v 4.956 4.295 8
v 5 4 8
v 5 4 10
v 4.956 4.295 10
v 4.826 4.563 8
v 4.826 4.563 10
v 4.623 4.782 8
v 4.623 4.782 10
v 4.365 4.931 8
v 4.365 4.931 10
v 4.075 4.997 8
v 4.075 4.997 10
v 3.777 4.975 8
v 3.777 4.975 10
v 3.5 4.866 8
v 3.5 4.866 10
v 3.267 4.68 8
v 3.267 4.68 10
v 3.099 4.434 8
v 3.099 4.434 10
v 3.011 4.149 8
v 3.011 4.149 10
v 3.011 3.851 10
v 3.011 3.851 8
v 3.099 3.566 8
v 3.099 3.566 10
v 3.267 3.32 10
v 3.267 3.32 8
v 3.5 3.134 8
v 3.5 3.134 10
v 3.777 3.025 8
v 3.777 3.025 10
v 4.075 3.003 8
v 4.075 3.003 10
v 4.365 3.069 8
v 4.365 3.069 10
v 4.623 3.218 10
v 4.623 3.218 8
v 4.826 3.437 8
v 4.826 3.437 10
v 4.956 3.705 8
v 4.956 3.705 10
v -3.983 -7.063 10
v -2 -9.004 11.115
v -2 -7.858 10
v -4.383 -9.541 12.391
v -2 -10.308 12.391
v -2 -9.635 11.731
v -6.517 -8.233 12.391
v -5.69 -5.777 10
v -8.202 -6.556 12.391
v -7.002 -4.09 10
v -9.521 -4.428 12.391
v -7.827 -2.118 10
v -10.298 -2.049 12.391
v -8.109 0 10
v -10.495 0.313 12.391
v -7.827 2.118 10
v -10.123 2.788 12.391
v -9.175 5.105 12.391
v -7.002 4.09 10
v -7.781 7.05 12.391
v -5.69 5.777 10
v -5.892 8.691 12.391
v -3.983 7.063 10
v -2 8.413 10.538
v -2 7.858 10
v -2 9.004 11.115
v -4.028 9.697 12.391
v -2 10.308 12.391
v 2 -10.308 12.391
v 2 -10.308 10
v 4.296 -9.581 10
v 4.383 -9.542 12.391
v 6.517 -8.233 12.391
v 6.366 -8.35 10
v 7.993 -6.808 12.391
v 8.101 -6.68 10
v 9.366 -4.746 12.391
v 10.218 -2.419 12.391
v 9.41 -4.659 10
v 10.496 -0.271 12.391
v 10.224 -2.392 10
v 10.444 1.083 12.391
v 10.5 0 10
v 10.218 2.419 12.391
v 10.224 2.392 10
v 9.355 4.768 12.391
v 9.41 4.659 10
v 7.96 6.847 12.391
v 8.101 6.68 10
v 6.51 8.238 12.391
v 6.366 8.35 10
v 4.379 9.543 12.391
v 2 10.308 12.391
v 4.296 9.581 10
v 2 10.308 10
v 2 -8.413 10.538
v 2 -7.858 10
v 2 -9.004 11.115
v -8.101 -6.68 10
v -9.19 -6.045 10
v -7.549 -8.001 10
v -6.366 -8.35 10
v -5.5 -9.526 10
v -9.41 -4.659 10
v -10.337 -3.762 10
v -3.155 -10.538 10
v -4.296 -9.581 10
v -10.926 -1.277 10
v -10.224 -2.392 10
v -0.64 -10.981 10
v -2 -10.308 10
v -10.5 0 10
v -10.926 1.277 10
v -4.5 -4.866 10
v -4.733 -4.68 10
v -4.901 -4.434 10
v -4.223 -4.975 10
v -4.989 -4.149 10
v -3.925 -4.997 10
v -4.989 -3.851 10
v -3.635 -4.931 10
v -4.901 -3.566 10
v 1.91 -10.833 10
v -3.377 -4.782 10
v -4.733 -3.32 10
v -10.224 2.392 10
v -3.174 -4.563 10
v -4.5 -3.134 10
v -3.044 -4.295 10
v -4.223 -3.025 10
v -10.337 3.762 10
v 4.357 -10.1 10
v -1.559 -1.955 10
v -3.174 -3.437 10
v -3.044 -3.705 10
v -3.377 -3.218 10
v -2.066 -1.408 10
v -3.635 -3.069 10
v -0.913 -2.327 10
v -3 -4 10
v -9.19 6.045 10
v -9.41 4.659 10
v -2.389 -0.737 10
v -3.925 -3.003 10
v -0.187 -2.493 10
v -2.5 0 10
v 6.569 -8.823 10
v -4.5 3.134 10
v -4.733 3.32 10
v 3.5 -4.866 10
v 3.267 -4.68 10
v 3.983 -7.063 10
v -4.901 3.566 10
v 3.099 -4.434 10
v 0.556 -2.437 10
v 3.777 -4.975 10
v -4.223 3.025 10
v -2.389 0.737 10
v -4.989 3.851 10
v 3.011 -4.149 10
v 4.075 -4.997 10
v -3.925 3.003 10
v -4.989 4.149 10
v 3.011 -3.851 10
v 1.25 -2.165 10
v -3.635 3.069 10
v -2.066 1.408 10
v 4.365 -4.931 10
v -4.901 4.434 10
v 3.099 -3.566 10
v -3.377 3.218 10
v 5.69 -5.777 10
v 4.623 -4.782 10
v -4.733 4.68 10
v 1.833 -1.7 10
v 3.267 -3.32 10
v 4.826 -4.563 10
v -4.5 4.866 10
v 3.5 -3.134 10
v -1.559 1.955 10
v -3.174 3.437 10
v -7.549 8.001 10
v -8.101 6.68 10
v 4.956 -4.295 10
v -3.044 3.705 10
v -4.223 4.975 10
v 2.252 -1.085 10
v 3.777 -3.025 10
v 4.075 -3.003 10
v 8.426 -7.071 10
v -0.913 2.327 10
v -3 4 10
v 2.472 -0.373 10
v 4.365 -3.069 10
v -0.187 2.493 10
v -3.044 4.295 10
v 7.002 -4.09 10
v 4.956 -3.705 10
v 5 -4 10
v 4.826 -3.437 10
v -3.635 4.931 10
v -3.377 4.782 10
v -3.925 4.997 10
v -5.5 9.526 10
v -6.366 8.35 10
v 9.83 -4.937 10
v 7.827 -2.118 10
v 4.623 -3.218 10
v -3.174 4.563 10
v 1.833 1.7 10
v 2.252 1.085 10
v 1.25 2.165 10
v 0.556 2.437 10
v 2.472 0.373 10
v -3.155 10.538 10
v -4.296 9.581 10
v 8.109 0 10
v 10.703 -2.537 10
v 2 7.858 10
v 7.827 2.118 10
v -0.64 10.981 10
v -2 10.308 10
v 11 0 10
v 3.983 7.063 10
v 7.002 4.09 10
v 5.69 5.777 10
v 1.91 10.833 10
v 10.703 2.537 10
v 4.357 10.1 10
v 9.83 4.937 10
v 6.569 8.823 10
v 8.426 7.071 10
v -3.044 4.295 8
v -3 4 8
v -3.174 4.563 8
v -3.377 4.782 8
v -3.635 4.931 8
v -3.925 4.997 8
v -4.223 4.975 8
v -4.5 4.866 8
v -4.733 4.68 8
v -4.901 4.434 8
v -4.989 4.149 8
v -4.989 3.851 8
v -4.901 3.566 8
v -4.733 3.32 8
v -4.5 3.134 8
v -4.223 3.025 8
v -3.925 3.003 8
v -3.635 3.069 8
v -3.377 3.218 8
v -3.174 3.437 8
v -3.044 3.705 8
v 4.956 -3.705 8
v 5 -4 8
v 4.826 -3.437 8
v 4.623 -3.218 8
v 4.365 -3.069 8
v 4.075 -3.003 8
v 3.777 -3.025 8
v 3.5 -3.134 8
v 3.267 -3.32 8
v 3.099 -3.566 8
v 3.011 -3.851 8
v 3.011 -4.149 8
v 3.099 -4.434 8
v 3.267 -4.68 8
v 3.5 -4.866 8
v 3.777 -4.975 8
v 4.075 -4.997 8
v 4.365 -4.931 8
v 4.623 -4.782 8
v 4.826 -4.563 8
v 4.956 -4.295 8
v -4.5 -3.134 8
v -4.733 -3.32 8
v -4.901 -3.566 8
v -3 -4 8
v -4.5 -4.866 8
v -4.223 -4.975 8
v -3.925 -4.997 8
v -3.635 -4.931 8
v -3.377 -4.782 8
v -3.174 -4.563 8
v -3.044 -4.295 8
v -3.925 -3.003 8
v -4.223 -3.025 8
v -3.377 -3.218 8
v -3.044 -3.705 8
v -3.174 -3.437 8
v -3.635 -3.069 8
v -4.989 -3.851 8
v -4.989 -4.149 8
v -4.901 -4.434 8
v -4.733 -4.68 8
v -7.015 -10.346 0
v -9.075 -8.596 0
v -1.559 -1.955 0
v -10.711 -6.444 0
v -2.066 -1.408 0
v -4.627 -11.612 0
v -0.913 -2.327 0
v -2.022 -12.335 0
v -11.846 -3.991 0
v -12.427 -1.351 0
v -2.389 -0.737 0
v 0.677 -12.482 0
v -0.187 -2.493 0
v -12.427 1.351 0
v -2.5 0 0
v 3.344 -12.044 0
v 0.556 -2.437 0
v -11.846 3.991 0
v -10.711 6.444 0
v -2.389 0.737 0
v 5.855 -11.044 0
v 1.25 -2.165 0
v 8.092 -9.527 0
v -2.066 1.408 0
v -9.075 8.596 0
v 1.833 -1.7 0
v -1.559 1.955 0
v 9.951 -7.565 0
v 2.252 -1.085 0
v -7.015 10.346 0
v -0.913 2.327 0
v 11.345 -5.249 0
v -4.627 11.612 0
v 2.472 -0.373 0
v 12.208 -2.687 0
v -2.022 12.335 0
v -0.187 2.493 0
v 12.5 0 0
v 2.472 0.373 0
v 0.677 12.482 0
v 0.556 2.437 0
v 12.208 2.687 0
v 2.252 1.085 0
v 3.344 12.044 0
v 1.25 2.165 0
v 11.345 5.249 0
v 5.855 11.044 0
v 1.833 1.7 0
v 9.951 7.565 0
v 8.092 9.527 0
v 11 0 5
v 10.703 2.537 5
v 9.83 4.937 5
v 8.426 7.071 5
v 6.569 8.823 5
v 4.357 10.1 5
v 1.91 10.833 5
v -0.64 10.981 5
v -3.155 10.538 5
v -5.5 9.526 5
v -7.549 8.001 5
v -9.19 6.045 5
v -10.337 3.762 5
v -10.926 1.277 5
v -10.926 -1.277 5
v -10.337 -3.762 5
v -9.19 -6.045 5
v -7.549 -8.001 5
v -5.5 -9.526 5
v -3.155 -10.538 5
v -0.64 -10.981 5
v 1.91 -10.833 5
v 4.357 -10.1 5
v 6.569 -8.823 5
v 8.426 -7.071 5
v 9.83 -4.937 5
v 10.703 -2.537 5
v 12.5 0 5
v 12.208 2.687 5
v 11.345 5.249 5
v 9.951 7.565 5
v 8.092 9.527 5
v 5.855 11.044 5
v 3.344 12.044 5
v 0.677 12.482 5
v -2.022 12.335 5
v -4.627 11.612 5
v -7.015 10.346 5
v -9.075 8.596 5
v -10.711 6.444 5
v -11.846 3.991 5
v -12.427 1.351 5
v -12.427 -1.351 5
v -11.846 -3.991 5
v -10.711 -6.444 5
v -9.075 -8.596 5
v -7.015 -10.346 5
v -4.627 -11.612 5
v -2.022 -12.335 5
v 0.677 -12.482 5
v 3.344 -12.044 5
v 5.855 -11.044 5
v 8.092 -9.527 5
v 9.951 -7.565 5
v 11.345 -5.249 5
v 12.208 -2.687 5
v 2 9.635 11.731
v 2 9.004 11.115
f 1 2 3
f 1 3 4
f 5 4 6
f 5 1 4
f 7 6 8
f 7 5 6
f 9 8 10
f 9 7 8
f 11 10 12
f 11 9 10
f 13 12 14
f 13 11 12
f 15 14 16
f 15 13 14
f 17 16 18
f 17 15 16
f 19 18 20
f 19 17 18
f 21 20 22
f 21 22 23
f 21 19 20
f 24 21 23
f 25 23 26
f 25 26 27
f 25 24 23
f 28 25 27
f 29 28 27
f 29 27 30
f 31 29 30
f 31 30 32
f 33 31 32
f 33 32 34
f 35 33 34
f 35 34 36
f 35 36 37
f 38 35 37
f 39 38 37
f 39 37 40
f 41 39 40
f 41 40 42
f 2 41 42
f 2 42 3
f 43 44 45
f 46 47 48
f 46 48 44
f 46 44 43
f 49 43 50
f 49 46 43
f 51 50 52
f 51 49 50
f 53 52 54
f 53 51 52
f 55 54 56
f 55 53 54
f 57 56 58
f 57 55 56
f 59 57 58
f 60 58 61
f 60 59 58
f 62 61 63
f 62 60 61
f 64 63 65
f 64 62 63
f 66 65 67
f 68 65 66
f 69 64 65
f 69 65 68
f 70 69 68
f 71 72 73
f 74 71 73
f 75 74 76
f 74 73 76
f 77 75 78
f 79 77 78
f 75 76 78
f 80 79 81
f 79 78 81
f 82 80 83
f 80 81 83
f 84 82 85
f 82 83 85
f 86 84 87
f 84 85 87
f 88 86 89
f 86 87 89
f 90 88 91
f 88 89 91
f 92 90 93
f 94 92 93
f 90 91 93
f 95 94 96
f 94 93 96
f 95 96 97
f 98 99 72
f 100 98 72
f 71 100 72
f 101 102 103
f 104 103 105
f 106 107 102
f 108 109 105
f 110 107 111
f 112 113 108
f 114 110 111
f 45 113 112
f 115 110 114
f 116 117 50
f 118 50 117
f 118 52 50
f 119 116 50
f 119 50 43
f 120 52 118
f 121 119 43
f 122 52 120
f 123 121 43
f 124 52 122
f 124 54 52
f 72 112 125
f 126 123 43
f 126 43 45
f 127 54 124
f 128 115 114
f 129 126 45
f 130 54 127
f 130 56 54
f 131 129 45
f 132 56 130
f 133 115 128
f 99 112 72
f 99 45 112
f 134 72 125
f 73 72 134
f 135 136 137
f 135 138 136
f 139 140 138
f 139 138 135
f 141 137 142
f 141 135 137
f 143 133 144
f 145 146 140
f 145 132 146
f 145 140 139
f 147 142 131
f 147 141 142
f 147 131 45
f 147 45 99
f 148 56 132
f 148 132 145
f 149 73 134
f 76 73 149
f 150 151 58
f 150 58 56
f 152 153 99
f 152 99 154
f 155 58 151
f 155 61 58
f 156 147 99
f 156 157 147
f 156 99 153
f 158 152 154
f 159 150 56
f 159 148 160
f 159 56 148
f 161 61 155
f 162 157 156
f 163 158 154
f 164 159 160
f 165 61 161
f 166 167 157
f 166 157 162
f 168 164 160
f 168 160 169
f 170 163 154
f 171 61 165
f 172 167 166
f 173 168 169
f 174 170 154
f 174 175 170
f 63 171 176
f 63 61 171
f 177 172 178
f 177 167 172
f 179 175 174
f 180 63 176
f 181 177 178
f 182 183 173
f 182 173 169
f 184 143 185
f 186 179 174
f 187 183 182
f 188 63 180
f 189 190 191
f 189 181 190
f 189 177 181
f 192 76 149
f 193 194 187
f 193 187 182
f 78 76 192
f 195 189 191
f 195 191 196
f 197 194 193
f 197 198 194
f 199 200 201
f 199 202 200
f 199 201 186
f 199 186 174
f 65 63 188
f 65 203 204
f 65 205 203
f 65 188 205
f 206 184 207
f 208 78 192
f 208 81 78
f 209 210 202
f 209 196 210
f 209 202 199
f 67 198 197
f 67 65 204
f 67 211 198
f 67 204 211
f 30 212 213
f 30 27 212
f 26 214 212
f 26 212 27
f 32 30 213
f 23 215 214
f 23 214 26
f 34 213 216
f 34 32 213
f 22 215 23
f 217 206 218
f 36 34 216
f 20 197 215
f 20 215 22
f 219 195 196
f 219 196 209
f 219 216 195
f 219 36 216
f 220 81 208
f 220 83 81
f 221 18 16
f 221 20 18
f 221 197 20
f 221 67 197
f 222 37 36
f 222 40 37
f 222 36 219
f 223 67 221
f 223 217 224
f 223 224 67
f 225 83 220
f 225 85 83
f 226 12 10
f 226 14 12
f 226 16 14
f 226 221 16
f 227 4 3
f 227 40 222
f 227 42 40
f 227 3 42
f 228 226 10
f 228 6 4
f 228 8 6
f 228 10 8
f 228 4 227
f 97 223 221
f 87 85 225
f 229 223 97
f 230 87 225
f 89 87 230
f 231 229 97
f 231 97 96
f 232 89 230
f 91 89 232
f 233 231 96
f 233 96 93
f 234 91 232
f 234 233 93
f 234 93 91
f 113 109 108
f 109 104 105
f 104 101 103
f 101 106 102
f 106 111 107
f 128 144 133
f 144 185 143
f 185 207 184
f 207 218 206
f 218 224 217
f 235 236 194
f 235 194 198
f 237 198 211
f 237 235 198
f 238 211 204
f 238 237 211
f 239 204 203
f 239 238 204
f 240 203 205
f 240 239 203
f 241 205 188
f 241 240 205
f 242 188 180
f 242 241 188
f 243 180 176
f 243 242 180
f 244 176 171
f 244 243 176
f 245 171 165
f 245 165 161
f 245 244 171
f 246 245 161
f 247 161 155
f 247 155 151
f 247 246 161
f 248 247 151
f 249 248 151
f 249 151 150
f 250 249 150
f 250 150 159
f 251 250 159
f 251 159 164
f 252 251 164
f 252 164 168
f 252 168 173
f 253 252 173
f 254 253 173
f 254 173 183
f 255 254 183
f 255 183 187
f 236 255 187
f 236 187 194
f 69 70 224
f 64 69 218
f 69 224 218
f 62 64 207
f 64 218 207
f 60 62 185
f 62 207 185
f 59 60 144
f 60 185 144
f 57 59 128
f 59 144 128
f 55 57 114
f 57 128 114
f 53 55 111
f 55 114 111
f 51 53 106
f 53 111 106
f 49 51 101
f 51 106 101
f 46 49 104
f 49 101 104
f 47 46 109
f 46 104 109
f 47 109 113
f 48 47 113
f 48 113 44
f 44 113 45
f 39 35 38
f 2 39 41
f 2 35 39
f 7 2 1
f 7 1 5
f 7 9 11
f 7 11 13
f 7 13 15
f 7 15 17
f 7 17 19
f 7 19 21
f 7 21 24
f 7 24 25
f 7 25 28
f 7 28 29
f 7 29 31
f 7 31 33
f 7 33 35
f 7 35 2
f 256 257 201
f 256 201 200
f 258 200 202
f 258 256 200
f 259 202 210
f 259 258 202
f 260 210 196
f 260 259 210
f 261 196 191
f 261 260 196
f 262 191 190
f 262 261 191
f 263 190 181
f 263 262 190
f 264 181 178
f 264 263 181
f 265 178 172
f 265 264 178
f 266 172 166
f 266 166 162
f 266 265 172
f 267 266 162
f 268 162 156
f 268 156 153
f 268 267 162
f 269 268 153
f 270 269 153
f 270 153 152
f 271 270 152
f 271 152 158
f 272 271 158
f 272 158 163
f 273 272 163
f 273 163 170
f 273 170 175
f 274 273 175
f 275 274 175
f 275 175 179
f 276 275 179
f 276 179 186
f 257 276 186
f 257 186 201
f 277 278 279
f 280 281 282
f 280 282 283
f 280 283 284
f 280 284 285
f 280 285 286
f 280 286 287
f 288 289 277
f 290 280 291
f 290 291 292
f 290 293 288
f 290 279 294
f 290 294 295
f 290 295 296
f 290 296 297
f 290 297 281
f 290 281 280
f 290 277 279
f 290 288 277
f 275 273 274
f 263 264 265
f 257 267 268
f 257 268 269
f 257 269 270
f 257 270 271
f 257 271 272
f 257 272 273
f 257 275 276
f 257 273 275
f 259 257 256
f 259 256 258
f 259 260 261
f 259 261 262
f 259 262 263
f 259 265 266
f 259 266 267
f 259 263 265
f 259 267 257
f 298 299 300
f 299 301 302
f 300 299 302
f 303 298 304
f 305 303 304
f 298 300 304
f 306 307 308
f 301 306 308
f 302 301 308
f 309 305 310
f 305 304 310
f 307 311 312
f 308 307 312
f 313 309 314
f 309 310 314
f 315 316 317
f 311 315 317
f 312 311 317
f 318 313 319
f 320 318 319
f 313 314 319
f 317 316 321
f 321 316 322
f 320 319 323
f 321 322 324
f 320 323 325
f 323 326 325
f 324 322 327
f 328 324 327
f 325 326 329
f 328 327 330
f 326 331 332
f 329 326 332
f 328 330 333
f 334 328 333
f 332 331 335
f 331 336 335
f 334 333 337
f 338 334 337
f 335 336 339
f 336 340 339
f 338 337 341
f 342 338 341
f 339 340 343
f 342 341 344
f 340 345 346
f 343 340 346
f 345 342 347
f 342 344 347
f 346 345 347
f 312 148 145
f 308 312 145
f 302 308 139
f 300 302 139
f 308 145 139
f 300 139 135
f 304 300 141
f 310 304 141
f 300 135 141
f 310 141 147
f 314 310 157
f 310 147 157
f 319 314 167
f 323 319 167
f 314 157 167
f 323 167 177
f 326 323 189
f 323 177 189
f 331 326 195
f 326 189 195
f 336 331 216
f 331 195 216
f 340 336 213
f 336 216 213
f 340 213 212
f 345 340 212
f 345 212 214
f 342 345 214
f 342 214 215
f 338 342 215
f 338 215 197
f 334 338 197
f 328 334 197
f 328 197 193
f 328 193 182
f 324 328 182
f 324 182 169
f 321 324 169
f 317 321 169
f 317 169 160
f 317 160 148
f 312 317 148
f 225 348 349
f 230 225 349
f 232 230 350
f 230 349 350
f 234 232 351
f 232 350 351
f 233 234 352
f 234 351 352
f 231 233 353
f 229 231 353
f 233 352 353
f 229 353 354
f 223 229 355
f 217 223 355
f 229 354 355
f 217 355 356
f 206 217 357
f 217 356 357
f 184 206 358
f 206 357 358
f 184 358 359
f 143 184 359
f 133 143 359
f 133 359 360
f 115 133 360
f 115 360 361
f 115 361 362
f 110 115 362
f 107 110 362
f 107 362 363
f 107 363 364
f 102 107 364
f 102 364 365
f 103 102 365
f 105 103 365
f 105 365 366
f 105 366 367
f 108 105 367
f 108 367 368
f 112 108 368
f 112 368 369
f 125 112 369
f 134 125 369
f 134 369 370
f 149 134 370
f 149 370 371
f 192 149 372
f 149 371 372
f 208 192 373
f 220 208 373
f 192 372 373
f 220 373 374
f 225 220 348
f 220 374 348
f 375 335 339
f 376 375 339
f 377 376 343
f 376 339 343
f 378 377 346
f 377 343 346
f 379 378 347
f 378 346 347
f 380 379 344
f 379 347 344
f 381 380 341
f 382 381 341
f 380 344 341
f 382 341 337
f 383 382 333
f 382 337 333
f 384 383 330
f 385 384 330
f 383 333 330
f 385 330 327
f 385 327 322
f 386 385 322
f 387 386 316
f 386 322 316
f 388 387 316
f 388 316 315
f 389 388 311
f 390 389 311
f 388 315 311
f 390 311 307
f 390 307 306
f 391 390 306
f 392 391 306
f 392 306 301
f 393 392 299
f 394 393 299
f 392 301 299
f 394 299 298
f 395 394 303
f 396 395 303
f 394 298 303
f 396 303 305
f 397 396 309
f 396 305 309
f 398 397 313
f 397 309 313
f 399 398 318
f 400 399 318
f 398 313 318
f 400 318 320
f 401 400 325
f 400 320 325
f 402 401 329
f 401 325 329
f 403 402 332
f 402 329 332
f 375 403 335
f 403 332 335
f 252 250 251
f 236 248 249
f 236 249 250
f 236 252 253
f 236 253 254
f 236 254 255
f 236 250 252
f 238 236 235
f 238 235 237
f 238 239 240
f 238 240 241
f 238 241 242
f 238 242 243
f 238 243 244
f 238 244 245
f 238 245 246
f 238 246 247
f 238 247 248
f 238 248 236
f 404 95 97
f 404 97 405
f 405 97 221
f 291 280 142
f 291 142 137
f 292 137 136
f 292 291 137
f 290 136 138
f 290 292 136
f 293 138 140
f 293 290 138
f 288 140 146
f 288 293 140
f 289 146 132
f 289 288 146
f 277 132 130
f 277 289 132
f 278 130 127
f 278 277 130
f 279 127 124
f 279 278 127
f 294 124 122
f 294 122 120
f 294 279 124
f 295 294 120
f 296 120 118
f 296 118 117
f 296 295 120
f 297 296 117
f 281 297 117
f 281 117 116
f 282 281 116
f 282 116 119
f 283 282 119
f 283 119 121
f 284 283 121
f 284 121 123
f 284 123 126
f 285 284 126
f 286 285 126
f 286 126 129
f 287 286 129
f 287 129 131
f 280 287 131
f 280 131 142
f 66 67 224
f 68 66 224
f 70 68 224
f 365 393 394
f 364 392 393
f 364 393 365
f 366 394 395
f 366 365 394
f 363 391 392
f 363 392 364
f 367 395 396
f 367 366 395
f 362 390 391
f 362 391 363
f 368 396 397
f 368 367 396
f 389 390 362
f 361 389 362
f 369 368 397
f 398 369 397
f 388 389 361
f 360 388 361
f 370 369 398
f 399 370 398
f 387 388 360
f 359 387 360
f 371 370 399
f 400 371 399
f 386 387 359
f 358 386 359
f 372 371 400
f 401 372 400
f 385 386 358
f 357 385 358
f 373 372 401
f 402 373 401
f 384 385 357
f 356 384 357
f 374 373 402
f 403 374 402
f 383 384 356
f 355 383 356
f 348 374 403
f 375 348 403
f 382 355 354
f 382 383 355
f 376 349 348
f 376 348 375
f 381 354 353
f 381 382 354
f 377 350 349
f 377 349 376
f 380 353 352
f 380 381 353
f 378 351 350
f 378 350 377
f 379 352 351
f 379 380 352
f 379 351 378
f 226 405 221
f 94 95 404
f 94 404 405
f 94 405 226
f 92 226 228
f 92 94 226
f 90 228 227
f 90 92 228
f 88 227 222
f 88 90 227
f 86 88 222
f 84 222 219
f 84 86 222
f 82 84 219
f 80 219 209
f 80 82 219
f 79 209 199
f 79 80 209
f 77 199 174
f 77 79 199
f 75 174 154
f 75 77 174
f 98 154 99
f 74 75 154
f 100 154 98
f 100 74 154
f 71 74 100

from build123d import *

# Parameters (mm, degrees)
F0_R        = 12.5
F0_R_2      = 11
F1_DEPTH    = 5
F0_R_3      = 1
F2_DEPTH    = 10
F3_DEPTH    = 15
F4_T4_ANGLE = 333.3635987438
F4_T9_ANGLE = 333.3635987438
F5_D        = 5
F5_DEPTH    = 12
F5_TIP      = 1.5021515476
F6_DEPTH    = 8


# Not quite as in the source:
# - a fillet or chamfer that OpenCascade refuses, or shapes differently, is made with other operations: its cross-section is extruded or revolved along the edge and cut away or added


with BuildPart() as f1:
    # F0 (on Top) → F1 (new body)
    with BuildSketch(Plane.XY):
        Circle(F0_R)
        Circle(F0_R_2, mode=Mode.SUBTRACT)
    extrude(amount=F1_DEPTH)

    # F0 (on Top) → F2 (join)
    with BuildSketch(Plane.XY):
        Circle(F0_R_2)
        with Locations((-4, -4)):
            Circle(F0_R_3, mode=Mode.SUBTRACT)
        with Locations((4, -4)):
            Circle(F0_R_3, mode=Mode.SUBTRACT)
        with BuildLine():
            ThreePointArc((-2, -10.307764064), (-10.5, 0), (-2, 10.307764064))
            Line((-2, 10.307764064), (-2, 7.8581159461))
            ThreePointArc((-2, 7.8581159461), (-8.1086365206, 0), (-2, -7.8581159461))
            Line((-2, -7.8581159461), (-2, -10.307764064))
        make_face(mode=Mode.SUBTRACT)
        with Locations((-4, 4)):
            Circle(F0_R_3, mode=Mode.SUBTRACT)
        with Locations((4, 4)):
            Circle(F0_R_3, mode=Mode.SUBTRACT)
        with BuildLine():
            ThreePointArc((2, 10.307764064), (10.5, 0), (2, -10.307764064))
            Line((2, -10.307764064), (2, -7.8581159461))
            ThreePointArc((2, -7.8581159461), (8.1086365206, 0), (2, 7.8581159461))
            Line((2, 7.8581159461), (2, 10.307764064))
        make_face(mode=Mode.SUBTRACT)
    extrude(amount=F2_DEPTH)

    # F0 (on Top) → F3 (join)
    with BuildSketch(Plane.XY):
        with BuildLine():
            Line((-2, 7.8581159461), (-2, 10.307764064))
            ThreePointArc((-2, 10.307764064), (-10.5, 0), (-2, -10.307764064))
            Line((-2, -10.307764064), (-2, -7.8581159461))
            ThreePointArc((-2, -7.8581159461), (-8.1086365206, 0), (-2, 7.8581159461))
        make_face()
        with BuildLine():
            Line((2, -7.8581159461), (2, -10.307764064))
            ThreePointArc((2, -10.307764064), (10.5, 0), (2, 10.307764064))
            Line((2, 10.307764064), (2, 7.8581159461))
            ThreePointArc((2, 7.8581159461), (8.1086365206, 0), (2, -7.8581159461))
        make_face()
    extrude(amount=F3_DEPTH)

    # F4: chamfer of 5 on 2 edges, made by hand


with BuildPart() as f4_tool2:
    # F4_s3 → F4_t4 (revolve)
    with BuildSketch(Plane(origin=(0, 0, 0), x_dir=(0, 0, 1), z_dir=(0.2303588664, 0.9731057459, 0))):
        Polygon((10, 8.1086365206), (15, 13.1086365206), (15, 8.1086365206), align=None)
    revolve(axis=Axis((0, 0, 15), (0, 0, -1)), revolution_arc=F4_T4_ANGLE)

    split(bisect_by=Plane.XY.offset(10), keep=Keep.TOP)


with BuildPart() as f1_1:
    add(f1.part)

    # F4_t1: cut F4_tool2
    add(f4_tool2.part, mode=Mode.SUBTRACT)


with BuildPart() as f4_tool7:
    # F4_s8 → F4_t9 (revolve)
    with BuildSketch(Plane(origin=(0, 0, 0), x_dir=(0, 0, 1), z_dir=(-0.2303588664, -0.9731057459, 0))):
        Polygon((10, 8.1086365206), (15, 13.1086365206), (15, 8.1086365206), align=None)
    revolve(axis=Axis((0, 0, 15), (0, 0, -1)), revolution_arc=F4_T9_ANGLE)

    split(bisect_by=Plane.XY.offset(10), keep=Keep.TOP)


with BuildPart() as f1_2:
    add(f1_1.part)

    # F4_t6: cut F4_tool7
    add(f4_tool7.part, mode=Mode.SUBTRACT)

    # F5
    with Locations(Plane(origin=(0, 0, 0), x_dir=(1, 0, 0), z_dir=(0, 0, -1))):
        with Locations((0, 0)):
            Hole(F5_D / 2, depth=F5_DEPTH)
            with Locations((0, 0, -(F5_DEPTH + F5_TIP / 2))):  # 118° drill point
                Cone(0, F5_D / 2, F5_TIP, mode=Mode.SUBTRACT)

    # F0 (on Top) → F6 (join)
    with BuildSketch(Plane.XY):
        with Locations((-4, 4)):
            Circle(F0_R_3)
        with Locations((4, 4)):
            Circle(F0_R_3)
        with Locations((-4, -4)):
            Circle(F0_R_3)
        with Locations((4, -4)):
            Circle(F0_R_3)
    extrude(amount=F6_DEPTH)


solid = f1_2.part
